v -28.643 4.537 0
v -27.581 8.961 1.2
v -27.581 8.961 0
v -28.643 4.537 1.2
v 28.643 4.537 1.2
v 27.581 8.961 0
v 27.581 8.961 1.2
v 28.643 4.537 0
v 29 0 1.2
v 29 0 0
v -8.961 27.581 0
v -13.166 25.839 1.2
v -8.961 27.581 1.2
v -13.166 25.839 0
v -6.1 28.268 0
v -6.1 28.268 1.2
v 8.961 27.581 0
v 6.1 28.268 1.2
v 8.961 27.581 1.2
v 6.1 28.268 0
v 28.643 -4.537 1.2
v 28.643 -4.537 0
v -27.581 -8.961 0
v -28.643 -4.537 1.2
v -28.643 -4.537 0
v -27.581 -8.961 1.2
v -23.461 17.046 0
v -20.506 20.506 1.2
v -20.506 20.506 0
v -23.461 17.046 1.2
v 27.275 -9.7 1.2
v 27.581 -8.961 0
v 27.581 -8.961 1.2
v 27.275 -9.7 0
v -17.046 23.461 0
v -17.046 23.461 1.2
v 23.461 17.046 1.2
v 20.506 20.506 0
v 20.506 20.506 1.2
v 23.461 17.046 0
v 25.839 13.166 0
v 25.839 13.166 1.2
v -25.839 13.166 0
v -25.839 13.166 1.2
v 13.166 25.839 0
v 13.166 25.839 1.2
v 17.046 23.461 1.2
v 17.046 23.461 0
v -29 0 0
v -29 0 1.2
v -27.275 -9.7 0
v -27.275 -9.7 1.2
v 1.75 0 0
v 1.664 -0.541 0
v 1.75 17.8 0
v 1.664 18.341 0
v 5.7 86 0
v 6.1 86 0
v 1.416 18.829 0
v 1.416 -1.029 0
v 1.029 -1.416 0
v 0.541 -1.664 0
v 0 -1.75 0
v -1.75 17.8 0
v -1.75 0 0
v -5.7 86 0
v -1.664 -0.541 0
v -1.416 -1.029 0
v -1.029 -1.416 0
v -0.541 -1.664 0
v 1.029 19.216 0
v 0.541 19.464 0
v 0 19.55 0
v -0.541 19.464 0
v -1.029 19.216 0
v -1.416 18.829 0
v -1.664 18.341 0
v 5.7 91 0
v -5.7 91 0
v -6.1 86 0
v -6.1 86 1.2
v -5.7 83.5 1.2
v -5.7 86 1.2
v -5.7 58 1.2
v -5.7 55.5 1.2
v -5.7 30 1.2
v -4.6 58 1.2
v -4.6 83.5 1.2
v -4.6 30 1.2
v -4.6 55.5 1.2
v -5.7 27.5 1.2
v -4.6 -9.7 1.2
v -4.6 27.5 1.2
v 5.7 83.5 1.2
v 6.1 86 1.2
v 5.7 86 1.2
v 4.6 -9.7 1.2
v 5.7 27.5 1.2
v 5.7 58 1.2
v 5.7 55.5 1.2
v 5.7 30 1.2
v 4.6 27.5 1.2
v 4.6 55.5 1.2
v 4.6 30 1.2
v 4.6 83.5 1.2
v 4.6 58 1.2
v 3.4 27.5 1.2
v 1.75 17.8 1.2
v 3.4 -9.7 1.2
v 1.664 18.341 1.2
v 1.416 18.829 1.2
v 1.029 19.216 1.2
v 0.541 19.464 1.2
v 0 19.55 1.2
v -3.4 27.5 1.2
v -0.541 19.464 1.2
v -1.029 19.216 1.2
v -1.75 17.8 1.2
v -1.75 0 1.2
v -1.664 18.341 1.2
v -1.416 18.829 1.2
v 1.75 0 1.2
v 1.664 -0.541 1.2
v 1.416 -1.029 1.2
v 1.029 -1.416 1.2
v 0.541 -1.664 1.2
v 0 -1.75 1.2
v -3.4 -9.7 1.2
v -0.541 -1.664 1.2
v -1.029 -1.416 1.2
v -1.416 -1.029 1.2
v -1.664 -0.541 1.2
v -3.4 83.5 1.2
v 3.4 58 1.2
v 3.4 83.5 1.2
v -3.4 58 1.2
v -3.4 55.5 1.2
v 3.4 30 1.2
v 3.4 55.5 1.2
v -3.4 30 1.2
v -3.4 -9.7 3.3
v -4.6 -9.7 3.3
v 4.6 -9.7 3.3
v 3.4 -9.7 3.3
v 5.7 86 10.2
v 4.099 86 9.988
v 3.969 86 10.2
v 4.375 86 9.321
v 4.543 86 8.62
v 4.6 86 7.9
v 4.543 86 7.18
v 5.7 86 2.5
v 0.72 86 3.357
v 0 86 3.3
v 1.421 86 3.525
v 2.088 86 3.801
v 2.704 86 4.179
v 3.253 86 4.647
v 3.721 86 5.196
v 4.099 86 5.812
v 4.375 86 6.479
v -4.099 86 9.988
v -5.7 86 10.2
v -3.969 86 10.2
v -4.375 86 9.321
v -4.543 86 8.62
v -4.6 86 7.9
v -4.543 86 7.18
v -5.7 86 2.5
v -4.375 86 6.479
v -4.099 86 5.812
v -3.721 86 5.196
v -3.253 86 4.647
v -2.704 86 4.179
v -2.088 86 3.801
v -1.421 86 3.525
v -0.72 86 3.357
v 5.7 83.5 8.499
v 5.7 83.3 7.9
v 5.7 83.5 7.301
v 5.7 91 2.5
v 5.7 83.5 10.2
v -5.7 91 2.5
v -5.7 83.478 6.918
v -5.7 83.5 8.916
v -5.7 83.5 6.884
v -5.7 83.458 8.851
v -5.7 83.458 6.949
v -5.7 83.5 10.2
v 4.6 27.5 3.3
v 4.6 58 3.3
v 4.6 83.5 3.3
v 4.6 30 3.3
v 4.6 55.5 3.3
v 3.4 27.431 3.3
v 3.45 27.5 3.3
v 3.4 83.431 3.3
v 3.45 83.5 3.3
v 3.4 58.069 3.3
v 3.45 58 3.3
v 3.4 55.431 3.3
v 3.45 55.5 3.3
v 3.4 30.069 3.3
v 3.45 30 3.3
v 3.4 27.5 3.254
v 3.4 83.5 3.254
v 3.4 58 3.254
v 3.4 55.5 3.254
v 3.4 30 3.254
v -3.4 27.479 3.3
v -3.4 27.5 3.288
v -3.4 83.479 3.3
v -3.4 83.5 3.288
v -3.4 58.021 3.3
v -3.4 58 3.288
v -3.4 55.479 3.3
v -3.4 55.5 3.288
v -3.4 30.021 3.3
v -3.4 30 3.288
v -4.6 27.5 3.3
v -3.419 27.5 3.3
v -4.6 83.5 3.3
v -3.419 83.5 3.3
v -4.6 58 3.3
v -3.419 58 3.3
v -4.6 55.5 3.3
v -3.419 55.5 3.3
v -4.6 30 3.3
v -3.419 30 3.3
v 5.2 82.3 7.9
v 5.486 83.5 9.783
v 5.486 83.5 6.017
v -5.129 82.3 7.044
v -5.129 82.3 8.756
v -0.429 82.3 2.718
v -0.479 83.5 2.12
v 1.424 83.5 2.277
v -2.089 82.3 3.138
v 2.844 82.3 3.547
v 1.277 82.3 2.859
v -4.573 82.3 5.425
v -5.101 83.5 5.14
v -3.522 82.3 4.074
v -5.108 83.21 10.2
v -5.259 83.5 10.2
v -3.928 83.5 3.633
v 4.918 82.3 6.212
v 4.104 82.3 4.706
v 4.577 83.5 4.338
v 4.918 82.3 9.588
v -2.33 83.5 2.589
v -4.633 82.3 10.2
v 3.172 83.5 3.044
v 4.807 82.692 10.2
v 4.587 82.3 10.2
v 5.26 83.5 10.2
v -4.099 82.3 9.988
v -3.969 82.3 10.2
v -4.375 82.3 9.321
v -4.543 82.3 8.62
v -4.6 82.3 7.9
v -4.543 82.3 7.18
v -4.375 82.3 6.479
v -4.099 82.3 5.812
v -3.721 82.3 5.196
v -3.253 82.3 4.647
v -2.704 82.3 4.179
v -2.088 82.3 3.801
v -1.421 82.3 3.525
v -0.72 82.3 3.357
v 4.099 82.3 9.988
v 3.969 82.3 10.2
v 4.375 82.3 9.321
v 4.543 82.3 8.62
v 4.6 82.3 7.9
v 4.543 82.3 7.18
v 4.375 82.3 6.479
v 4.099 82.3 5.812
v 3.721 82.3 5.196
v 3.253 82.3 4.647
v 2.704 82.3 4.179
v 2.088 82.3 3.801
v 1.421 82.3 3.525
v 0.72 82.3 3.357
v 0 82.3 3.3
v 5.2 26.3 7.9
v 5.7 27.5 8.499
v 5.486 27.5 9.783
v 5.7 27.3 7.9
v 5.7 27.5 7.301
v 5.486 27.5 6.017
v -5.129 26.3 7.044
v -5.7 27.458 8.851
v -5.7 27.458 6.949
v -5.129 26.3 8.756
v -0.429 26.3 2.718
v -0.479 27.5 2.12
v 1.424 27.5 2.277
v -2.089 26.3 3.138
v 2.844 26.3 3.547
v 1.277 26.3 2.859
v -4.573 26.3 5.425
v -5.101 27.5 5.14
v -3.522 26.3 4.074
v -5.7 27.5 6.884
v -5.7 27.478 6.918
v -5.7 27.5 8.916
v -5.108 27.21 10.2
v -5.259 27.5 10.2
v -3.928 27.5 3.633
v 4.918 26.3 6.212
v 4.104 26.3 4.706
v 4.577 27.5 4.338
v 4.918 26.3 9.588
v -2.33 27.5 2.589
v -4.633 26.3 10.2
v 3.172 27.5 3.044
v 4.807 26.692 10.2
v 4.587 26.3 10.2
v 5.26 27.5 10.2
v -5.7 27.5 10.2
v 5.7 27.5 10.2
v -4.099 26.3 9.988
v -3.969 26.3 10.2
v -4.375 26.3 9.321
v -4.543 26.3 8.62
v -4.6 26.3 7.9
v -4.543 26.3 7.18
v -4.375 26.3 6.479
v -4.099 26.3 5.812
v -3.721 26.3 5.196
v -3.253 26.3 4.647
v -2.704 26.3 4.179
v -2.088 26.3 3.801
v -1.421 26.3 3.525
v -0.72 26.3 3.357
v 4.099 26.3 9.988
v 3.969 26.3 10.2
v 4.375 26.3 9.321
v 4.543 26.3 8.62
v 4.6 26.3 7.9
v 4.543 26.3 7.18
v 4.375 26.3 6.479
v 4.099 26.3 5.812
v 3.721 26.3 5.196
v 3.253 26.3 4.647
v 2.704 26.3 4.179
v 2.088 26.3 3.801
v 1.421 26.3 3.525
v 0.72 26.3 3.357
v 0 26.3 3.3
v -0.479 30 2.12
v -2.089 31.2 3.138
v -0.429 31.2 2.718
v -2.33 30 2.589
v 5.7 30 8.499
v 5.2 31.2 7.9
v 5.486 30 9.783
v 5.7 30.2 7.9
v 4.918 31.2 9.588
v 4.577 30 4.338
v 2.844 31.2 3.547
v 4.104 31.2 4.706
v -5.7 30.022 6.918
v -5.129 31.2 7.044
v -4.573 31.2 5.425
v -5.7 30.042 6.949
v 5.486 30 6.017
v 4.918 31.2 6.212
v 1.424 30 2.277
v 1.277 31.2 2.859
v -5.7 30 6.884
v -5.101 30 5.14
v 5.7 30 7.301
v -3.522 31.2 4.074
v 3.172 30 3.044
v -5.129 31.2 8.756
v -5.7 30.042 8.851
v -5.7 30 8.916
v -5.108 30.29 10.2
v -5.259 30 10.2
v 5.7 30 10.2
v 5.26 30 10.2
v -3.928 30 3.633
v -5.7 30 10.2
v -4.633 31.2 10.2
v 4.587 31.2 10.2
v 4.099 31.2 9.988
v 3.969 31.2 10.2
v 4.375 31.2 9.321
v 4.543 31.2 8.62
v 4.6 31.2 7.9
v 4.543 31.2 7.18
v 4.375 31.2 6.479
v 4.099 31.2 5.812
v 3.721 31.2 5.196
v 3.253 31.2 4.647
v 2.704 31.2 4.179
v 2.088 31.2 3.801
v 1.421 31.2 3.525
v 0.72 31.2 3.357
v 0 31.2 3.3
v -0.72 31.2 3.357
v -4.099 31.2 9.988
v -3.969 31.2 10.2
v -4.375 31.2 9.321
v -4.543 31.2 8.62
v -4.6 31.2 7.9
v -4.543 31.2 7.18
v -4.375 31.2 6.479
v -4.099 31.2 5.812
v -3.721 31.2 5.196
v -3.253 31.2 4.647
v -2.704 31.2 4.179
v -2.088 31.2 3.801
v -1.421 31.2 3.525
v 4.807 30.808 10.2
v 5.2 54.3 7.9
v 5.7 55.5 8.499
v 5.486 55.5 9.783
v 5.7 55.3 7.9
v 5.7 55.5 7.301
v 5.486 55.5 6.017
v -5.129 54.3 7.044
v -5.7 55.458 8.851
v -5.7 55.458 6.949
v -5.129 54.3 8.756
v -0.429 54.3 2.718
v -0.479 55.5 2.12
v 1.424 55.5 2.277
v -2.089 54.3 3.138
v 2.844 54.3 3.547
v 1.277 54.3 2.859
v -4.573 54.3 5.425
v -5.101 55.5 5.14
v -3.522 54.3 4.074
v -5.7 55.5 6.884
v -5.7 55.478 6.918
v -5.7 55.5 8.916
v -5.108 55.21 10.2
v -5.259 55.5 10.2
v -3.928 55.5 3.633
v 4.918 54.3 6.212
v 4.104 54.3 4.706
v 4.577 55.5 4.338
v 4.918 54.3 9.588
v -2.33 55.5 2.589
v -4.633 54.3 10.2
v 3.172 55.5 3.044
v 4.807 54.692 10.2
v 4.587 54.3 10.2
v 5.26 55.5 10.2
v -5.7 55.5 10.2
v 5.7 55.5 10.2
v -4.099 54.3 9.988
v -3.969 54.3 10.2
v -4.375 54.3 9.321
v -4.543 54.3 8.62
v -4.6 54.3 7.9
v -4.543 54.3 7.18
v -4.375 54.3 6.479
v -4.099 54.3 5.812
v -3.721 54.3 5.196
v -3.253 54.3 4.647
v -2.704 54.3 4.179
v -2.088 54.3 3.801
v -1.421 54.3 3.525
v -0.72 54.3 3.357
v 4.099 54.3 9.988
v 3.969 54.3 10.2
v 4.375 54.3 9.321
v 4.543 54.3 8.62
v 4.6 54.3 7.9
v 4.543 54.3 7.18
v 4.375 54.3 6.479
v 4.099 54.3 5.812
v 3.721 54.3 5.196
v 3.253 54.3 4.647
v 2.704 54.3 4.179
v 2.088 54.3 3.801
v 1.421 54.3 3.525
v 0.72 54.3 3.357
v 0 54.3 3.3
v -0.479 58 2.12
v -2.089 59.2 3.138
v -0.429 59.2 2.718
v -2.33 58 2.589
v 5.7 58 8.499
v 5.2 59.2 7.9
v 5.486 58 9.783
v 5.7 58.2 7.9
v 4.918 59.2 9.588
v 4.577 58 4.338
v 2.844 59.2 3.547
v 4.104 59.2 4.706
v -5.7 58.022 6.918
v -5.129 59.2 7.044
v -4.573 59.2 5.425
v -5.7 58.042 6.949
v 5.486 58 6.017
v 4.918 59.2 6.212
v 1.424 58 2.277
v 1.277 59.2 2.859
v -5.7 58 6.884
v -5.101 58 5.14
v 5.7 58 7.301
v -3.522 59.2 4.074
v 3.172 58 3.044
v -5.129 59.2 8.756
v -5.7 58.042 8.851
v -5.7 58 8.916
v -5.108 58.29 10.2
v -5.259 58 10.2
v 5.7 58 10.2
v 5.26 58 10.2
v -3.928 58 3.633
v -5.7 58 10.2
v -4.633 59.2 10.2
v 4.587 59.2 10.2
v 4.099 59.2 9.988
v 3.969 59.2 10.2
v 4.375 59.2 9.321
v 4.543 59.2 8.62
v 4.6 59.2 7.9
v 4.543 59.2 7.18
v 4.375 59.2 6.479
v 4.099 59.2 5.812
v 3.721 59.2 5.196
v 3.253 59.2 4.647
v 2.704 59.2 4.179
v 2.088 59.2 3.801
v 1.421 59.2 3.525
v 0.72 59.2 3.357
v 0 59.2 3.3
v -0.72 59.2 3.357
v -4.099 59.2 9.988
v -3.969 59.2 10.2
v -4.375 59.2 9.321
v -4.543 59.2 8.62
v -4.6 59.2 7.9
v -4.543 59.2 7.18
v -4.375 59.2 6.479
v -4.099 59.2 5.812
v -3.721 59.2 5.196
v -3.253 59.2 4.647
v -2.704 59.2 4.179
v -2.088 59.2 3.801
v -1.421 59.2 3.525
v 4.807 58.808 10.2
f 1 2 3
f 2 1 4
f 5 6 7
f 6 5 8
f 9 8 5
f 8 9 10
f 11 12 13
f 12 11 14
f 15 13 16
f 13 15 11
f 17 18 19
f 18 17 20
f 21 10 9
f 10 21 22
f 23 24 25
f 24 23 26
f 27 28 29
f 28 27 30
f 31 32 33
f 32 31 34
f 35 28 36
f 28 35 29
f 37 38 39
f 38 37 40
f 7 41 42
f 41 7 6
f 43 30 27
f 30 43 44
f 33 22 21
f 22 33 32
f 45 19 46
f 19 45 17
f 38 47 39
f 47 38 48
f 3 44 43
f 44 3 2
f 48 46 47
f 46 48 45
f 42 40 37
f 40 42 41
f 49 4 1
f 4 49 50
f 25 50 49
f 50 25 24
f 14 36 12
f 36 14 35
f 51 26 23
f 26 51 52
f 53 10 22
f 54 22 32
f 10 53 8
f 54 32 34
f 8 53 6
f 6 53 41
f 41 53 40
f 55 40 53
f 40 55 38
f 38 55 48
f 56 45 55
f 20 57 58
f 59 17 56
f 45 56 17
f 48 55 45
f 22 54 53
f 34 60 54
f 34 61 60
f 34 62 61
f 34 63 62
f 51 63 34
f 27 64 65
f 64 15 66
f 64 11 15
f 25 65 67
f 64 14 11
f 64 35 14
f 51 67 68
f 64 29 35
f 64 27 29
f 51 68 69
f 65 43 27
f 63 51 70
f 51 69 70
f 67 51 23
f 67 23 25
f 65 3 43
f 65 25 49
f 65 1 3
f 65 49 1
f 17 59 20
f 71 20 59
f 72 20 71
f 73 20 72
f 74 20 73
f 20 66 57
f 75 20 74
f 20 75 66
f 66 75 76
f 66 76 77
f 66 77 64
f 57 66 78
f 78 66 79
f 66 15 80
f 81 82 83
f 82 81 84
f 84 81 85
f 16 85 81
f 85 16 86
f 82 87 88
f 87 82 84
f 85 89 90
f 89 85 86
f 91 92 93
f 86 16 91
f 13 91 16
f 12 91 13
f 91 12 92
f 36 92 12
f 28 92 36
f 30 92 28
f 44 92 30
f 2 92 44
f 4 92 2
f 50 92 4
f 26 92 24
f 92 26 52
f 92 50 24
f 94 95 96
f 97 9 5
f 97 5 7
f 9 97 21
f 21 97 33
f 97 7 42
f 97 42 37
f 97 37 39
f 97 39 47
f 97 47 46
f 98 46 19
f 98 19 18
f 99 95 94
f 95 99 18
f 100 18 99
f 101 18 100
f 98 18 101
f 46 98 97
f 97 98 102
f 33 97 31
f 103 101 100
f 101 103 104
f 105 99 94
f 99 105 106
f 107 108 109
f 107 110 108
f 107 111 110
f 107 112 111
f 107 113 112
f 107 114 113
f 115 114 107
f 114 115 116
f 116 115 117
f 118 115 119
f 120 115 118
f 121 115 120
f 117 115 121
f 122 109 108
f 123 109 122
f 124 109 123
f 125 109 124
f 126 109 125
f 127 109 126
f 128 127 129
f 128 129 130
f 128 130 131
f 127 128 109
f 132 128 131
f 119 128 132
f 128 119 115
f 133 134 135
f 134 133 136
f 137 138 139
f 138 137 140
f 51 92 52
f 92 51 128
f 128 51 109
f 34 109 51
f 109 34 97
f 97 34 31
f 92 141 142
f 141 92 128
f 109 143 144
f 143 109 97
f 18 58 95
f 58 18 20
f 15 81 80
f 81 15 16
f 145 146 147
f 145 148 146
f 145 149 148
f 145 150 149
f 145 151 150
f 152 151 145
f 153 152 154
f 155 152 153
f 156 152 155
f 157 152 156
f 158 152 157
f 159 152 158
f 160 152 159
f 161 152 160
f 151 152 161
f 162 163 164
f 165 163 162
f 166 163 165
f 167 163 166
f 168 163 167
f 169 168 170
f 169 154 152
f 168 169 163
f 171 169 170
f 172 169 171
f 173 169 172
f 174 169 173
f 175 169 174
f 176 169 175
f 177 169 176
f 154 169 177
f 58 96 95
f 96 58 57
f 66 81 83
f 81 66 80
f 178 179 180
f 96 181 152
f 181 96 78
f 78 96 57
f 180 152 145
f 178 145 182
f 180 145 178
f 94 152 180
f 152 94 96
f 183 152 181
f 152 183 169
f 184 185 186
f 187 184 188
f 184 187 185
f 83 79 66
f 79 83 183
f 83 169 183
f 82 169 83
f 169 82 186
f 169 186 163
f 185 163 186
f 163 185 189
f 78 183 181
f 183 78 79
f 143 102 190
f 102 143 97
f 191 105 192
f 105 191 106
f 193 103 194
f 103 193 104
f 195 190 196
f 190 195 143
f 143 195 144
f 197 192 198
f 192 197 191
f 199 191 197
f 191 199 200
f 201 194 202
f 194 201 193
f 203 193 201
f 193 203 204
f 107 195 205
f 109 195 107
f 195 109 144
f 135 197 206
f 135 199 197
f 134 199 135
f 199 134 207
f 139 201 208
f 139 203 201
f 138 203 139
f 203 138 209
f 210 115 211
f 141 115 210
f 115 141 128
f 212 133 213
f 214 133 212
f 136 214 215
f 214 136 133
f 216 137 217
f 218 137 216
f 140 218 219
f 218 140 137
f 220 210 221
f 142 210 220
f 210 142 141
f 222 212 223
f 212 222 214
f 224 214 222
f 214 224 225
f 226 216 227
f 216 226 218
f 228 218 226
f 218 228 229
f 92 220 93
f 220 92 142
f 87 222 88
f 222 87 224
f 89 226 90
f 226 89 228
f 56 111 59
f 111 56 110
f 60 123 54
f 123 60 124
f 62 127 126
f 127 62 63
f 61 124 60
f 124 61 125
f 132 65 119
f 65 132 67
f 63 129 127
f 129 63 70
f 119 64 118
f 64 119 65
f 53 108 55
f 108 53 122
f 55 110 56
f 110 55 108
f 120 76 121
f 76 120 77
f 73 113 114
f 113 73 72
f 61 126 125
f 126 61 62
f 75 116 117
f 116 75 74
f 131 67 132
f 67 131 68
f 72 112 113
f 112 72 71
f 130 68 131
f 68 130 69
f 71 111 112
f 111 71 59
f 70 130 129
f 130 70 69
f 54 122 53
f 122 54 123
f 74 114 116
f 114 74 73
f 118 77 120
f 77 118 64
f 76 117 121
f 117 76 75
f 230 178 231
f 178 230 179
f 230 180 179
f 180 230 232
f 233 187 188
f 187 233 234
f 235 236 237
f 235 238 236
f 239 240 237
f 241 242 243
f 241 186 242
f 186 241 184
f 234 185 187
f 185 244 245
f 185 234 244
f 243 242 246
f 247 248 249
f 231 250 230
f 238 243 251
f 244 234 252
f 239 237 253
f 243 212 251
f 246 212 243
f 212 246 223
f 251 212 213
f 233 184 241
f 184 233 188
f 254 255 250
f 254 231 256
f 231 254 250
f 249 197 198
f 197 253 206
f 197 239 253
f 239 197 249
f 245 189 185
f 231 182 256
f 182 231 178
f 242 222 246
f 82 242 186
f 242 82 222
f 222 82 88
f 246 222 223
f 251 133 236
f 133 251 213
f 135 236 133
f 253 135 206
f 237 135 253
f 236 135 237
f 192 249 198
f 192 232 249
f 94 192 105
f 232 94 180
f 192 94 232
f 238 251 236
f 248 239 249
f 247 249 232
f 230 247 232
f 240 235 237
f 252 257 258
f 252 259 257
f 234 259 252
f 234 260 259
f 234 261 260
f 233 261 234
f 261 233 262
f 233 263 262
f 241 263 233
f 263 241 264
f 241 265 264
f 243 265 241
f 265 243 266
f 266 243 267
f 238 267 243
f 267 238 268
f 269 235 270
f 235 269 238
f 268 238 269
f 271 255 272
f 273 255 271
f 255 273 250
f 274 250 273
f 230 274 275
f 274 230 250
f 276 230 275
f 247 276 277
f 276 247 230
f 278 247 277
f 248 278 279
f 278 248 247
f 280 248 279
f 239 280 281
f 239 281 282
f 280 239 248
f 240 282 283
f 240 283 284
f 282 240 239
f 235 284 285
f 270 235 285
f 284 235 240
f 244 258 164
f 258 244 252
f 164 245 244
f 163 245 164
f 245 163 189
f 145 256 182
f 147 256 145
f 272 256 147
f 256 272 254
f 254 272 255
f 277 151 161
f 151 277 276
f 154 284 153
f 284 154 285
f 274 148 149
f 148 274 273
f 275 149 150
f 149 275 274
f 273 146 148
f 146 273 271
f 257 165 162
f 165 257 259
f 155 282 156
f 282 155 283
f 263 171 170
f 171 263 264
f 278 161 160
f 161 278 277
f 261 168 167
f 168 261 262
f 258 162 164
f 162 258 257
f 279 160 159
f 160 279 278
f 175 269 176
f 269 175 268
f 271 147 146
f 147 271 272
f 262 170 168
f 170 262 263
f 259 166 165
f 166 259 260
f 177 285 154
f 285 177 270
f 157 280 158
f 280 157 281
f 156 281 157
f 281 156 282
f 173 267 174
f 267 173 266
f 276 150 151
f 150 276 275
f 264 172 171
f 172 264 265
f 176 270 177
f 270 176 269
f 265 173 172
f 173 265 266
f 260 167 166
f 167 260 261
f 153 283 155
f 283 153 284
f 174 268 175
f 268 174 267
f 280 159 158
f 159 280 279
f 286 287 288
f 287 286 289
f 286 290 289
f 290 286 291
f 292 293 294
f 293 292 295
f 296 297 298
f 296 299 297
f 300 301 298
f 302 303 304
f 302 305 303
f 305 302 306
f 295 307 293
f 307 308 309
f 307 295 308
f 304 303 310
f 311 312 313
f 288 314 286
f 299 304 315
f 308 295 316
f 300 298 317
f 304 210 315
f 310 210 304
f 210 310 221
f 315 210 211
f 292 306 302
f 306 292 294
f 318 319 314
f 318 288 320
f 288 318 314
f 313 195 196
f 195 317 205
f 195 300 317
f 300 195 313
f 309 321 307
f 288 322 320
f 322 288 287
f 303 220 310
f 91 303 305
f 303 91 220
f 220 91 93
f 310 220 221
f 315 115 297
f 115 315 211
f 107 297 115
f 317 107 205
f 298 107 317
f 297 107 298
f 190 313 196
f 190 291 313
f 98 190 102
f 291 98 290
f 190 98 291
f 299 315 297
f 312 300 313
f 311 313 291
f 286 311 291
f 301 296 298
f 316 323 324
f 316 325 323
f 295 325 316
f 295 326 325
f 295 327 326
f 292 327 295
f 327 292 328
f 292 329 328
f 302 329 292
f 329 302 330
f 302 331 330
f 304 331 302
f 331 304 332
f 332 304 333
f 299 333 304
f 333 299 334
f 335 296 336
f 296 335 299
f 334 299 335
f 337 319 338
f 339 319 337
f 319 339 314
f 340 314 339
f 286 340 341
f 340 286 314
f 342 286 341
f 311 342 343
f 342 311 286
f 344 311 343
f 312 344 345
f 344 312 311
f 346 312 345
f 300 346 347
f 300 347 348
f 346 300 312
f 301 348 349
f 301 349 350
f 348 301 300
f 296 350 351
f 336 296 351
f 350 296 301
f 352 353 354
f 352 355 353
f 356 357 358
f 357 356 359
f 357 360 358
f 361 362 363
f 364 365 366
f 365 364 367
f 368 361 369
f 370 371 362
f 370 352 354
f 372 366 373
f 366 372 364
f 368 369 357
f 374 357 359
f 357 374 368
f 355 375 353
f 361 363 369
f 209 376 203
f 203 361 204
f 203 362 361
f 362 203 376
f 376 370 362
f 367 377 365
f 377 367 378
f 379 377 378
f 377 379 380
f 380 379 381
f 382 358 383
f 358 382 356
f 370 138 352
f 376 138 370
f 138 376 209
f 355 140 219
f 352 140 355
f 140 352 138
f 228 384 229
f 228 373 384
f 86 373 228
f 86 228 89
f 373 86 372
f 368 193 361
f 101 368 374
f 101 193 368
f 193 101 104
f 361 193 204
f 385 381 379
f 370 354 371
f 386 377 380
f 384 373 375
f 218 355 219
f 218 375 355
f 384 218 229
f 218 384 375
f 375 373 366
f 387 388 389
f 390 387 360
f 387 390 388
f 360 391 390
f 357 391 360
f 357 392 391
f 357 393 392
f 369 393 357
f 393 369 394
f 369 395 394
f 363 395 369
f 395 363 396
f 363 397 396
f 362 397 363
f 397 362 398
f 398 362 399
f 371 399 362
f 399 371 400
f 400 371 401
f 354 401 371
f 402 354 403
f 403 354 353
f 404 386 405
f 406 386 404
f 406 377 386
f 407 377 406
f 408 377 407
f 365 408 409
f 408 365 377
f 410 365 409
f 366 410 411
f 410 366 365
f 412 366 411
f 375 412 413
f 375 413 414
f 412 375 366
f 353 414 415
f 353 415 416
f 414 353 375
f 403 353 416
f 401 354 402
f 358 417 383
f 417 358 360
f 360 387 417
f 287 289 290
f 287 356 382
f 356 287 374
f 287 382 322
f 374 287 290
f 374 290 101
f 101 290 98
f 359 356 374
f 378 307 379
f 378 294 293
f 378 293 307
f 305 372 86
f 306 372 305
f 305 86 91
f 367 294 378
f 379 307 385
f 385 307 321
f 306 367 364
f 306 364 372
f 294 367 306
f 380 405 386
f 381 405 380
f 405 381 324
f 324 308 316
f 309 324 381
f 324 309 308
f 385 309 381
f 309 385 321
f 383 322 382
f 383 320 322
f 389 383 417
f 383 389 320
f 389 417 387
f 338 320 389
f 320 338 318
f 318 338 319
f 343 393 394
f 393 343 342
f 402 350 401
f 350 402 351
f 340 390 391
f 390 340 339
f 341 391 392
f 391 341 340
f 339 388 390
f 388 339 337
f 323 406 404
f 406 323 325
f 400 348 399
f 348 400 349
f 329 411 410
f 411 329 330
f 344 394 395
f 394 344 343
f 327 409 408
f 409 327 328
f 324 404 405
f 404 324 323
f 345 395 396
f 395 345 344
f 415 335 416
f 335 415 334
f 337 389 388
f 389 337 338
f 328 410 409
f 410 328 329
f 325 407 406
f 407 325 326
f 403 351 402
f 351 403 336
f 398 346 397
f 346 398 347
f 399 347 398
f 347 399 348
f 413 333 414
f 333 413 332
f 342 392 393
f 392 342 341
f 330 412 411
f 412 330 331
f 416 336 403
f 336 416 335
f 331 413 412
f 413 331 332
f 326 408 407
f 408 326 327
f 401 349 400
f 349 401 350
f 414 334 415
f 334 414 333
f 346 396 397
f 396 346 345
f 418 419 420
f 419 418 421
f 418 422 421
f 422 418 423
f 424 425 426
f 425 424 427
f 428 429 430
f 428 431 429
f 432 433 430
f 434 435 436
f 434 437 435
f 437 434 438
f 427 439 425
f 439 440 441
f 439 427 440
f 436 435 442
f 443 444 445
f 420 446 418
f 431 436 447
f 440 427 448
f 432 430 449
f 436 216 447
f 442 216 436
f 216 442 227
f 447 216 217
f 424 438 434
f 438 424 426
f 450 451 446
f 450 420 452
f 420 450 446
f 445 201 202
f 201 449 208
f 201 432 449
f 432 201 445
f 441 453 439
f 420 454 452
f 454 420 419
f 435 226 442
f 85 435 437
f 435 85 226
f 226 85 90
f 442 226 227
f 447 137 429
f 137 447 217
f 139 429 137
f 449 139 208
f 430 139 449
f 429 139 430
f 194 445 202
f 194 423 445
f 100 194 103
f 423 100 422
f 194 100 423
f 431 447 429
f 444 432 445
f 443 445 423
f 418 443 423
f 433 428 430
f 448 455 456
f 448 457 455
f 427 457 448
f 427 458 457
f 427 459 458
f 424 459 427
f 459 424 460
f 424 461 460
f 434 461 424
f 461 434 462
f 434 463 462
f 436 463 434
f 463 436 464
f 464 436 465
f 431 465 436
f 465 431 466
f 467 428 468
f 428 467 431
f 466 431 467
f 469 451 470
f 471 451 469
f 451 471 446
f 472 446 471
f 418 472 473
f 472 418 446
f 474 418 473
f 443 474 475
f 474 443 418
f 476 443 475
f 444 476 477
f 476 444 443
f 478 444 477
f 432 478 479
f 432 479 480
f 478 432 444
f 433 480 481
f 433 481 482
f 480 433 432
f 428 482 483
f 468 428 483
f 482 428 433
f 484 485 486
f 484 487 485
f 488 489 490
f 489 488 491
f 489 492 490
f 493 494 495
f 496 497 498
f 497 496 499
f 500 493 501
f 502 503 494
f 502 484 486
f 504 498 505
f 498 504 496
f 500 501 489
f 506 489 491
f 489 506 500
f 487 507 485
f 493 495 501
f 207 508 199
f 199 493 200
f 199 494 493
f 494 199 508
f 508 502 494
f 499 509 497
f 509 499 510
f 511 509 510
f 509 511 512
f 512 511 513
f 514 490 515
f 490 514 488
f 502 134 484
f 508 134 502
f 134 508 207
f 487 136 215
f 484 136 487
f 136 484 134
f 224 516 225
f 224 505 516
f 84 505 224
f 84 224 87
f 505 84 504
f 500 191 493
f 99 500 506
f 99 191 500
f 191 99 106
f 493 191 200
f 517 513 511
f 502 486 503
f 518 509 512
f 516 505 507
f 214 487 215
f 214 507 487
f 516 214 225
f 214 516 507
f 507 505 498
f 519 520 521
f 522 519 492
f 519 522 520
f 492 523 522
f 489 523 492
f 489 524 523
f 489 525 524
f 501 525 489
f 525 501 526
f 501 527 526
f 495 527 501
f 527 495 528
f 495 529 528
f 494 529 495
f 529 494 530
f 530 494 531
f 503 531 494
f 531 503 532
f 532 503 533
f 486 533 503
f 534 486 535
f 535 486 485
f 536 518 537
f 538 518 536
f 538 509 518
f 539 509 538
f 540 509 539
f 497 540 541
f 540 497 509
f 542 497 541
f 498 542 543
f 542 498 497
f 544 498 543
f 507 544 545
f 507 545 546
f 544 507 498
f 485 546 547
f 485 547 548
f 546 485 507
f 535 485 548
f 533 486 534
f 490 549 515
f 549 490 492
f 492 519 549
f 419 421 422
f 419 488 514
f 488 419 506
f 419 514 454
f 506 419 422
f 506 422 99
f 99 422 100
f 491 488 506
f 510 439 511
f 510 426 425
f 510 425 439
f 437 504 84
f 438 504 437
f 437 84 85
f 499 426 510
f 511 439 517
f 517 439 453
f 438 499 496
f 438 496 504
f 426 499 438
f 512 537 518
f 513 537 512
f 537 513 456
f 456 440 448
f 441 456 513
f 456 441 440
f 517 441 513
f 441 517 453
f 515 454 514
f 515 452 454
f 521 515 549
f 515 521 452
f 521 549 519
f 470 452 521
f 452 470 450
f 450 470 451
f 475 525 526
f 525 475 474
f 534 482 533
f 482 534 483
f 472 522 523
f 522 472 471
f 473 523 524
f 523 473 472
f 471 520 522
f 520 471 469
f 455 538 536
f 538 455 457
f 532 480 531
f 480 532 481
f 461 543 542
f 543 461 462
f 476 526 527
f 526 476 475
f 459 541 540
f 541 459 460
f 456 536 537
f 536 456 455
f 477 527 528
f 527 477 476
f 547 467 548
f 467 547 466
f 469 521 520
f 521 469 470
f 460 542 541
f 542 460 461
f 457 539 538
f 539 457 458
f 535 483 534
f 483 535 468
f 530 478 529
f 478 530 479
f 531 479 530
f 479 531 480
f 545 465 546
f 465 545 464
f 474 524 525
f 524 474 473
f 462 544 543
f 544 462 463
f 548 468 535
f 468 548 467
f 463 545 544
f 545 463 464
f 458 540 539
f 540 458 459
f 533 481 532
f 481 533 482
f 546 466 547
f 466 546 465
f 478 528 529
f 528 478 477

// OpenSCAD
//
//  Door for retractable landing wheel (in wing)
//
//  Design by Egil Kvaleberg, 31 January 2015
//

// door extra overlap around leg and wheels
margin = 1.5;

// main door wall thickness
wall = 1.2;

// diameter of strut leg
leg_dia = 9.2;
// distance from top of leg to wheel centre
leg_len = 86.0;

// diameter of wheel
wheel_dia = 55.0;

// extra tab above top of leg, 0 if none
leg_extra = 5.0;
// width of extra tab, also decides width of clips
leg_extra_width = 11.4;
// wall thickness of extra tab
leg_extra_wall = 2.5;

// wall thickness of clips that fastens door to leg
cwall = 2.5;

// relative size of leg clip flex section, from 0.0 to 0.5
clip_size = 0.25;

// distance from surface of door to center of leg
surface_to_c = 7.9;

// length of wheel spring action
sprung_len = 17.8;

// diameter of wheel axle, 0 if it does not protrude through door
axle_dia = 3.5;

d = 1*0.01;

module clip(is_top) {
	rotate ([90, 0, 0]) difference () {
		union () {
			translate([-leg_extra_width/2, 0, -cwall/2]) cube([leg_extra_width, surface_to_c + clip_size*leg_dia, cwall]);
			intersection () { // extra rim
				union () {
					translate([0, surface_to_c, cwall/2]) cylinder(r1=leg_dia/2+wall, r2=leg_dia/2+wall/2, h=wall);
					if (!is_top) translate([0, surface_to_c, -cwall/2-wall]) cylinder(r2=leg_dia/2+wall, r1=leg_dia/2+wall/2, h=wall);
				}
				translate([-leg_extra_width/2, 0, -cwall/2-wall-d]) cube([leg_extra_width, surface_to_c + clip_size*leg_dia, cwall+2*wall+2*d]);
			}
		}
		translate([0, surface_to_c, -cwall/2-wall-d]) cylinder(r=leg_dia/2, h=cwall+2*wall+2*d, $fn=40);
	}
}

module cover() {
	difference () { 
		union () {
			translate([-leg_dia/2 - margin, 0, 0]) cube([2*margin+leg_dia, leg_len, wall]);
			translate([-leg_extra_width/2, leg_len, 0]) cube([leg_extra_width, leg_extra, leg_extra_wall]);

			// 2 strengthening bars
			translate([leg_dia/2 - wall, -wheel_dia/2 + sprung_len, 0]) cube([wall, leg_len + wheel_dia/2-sprung_len, surface_to_c-leg_dia/2]);
			translate([-leg_dia/2, -wheel_dia/2 + sprung_len, 0]) cube([wall, leg_len + wheel_dia/2-sprung_len, surface_to_c-leg_dia/2]);
			intersection () {
				cylinder(r=wheel_dia/2 + margin, h=wall, $fn=40);
				translate([-wheel_dia/2 - margin -d, sprung_len-wheel_dia/2, -d]) cube([2*margin+wheel_dia+2*d, 2*margin+wheel_dia, wall+2*d]);
			}
		}
		hull () {
			translate ([0,0,-d]) cylinder(r=axle_dia/2, h=wall+2*d, $fn=20);
			translate ([0,sprung_len,-d]) cylinder(r=axle_dia/2, h=wall+2*d, $fn=20);
		}
	}
}

cover();
translate ([0, leg_len-cwall/2, 0]) clip(true);
translate ([0, wheel_dia/2+cwall/2, 0]) clip(false);
translate ([0, (leg_len+wheel_dia/2)/2, 0]) clip(false);



